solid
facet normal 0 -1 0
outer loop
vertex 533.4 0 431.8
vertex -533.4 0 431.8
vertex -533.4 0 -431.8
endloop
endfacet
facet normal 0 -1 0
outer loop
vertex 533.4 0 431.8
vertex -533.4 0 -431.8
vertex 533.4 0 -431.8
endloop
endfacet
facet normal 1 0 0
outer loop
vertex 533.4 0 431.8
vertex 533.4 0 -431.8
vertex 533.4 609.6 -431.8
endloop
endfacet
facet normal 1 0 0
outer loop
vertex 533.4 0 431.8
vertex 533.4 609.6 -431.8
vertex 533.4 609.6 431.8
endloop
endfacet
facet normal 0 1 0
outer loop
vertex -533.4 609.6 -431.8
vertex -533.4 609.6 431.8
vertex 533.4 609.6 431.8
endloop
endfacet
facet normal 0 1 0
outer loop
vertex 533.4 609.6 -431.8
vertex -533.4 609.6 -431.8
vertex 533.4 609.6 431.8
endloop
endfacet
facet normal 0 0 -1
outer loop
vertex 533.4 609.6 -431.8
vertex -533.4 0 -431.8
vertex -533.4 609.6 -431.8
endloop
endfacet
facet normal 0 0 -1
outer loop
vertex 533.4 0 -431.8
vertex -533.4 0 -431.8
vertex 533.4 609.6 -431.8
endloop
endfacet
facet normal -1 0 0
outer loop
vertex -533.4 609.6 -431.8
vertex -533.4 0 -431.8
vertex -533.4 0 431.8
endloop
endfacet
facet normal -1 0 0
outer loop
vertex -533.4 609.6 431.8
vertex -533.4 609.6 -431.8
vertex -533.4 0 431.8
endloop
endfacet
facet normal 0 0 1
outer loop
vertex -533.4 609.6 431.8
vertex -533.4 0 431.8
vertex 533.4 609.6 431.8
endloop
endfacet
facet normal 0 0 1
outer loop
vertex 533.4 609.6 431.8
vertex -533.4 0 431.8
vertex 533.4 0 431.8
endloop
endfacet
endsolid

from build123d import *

# Parameters (mm, degrees)
F0_W     = 1066.8
F0_H     = 863.6
F1_DEPTH = 609.6
F2_W     = 75.707137
F2_H     = 83.061278
F3_DEPTH = 25.4


with BuildPart() as f1:
    # F0 (on Front) → F1 (new body)
    with BuildSketch(Plane.XZ):
        Rectangle(F0_W, F0_H)
    extrude(amount=-F1_DEPTH)


with BuildPart() as f3:
    # F2 (on face) → F3 (new body)
    with BuildSketch(Plane.XZ):
        with Locations((571.253569, -41.530639)):
            Rectangle(F2_W, F2_H)
    extrude(amount=F3_DEPTH)


solid = f1.part
